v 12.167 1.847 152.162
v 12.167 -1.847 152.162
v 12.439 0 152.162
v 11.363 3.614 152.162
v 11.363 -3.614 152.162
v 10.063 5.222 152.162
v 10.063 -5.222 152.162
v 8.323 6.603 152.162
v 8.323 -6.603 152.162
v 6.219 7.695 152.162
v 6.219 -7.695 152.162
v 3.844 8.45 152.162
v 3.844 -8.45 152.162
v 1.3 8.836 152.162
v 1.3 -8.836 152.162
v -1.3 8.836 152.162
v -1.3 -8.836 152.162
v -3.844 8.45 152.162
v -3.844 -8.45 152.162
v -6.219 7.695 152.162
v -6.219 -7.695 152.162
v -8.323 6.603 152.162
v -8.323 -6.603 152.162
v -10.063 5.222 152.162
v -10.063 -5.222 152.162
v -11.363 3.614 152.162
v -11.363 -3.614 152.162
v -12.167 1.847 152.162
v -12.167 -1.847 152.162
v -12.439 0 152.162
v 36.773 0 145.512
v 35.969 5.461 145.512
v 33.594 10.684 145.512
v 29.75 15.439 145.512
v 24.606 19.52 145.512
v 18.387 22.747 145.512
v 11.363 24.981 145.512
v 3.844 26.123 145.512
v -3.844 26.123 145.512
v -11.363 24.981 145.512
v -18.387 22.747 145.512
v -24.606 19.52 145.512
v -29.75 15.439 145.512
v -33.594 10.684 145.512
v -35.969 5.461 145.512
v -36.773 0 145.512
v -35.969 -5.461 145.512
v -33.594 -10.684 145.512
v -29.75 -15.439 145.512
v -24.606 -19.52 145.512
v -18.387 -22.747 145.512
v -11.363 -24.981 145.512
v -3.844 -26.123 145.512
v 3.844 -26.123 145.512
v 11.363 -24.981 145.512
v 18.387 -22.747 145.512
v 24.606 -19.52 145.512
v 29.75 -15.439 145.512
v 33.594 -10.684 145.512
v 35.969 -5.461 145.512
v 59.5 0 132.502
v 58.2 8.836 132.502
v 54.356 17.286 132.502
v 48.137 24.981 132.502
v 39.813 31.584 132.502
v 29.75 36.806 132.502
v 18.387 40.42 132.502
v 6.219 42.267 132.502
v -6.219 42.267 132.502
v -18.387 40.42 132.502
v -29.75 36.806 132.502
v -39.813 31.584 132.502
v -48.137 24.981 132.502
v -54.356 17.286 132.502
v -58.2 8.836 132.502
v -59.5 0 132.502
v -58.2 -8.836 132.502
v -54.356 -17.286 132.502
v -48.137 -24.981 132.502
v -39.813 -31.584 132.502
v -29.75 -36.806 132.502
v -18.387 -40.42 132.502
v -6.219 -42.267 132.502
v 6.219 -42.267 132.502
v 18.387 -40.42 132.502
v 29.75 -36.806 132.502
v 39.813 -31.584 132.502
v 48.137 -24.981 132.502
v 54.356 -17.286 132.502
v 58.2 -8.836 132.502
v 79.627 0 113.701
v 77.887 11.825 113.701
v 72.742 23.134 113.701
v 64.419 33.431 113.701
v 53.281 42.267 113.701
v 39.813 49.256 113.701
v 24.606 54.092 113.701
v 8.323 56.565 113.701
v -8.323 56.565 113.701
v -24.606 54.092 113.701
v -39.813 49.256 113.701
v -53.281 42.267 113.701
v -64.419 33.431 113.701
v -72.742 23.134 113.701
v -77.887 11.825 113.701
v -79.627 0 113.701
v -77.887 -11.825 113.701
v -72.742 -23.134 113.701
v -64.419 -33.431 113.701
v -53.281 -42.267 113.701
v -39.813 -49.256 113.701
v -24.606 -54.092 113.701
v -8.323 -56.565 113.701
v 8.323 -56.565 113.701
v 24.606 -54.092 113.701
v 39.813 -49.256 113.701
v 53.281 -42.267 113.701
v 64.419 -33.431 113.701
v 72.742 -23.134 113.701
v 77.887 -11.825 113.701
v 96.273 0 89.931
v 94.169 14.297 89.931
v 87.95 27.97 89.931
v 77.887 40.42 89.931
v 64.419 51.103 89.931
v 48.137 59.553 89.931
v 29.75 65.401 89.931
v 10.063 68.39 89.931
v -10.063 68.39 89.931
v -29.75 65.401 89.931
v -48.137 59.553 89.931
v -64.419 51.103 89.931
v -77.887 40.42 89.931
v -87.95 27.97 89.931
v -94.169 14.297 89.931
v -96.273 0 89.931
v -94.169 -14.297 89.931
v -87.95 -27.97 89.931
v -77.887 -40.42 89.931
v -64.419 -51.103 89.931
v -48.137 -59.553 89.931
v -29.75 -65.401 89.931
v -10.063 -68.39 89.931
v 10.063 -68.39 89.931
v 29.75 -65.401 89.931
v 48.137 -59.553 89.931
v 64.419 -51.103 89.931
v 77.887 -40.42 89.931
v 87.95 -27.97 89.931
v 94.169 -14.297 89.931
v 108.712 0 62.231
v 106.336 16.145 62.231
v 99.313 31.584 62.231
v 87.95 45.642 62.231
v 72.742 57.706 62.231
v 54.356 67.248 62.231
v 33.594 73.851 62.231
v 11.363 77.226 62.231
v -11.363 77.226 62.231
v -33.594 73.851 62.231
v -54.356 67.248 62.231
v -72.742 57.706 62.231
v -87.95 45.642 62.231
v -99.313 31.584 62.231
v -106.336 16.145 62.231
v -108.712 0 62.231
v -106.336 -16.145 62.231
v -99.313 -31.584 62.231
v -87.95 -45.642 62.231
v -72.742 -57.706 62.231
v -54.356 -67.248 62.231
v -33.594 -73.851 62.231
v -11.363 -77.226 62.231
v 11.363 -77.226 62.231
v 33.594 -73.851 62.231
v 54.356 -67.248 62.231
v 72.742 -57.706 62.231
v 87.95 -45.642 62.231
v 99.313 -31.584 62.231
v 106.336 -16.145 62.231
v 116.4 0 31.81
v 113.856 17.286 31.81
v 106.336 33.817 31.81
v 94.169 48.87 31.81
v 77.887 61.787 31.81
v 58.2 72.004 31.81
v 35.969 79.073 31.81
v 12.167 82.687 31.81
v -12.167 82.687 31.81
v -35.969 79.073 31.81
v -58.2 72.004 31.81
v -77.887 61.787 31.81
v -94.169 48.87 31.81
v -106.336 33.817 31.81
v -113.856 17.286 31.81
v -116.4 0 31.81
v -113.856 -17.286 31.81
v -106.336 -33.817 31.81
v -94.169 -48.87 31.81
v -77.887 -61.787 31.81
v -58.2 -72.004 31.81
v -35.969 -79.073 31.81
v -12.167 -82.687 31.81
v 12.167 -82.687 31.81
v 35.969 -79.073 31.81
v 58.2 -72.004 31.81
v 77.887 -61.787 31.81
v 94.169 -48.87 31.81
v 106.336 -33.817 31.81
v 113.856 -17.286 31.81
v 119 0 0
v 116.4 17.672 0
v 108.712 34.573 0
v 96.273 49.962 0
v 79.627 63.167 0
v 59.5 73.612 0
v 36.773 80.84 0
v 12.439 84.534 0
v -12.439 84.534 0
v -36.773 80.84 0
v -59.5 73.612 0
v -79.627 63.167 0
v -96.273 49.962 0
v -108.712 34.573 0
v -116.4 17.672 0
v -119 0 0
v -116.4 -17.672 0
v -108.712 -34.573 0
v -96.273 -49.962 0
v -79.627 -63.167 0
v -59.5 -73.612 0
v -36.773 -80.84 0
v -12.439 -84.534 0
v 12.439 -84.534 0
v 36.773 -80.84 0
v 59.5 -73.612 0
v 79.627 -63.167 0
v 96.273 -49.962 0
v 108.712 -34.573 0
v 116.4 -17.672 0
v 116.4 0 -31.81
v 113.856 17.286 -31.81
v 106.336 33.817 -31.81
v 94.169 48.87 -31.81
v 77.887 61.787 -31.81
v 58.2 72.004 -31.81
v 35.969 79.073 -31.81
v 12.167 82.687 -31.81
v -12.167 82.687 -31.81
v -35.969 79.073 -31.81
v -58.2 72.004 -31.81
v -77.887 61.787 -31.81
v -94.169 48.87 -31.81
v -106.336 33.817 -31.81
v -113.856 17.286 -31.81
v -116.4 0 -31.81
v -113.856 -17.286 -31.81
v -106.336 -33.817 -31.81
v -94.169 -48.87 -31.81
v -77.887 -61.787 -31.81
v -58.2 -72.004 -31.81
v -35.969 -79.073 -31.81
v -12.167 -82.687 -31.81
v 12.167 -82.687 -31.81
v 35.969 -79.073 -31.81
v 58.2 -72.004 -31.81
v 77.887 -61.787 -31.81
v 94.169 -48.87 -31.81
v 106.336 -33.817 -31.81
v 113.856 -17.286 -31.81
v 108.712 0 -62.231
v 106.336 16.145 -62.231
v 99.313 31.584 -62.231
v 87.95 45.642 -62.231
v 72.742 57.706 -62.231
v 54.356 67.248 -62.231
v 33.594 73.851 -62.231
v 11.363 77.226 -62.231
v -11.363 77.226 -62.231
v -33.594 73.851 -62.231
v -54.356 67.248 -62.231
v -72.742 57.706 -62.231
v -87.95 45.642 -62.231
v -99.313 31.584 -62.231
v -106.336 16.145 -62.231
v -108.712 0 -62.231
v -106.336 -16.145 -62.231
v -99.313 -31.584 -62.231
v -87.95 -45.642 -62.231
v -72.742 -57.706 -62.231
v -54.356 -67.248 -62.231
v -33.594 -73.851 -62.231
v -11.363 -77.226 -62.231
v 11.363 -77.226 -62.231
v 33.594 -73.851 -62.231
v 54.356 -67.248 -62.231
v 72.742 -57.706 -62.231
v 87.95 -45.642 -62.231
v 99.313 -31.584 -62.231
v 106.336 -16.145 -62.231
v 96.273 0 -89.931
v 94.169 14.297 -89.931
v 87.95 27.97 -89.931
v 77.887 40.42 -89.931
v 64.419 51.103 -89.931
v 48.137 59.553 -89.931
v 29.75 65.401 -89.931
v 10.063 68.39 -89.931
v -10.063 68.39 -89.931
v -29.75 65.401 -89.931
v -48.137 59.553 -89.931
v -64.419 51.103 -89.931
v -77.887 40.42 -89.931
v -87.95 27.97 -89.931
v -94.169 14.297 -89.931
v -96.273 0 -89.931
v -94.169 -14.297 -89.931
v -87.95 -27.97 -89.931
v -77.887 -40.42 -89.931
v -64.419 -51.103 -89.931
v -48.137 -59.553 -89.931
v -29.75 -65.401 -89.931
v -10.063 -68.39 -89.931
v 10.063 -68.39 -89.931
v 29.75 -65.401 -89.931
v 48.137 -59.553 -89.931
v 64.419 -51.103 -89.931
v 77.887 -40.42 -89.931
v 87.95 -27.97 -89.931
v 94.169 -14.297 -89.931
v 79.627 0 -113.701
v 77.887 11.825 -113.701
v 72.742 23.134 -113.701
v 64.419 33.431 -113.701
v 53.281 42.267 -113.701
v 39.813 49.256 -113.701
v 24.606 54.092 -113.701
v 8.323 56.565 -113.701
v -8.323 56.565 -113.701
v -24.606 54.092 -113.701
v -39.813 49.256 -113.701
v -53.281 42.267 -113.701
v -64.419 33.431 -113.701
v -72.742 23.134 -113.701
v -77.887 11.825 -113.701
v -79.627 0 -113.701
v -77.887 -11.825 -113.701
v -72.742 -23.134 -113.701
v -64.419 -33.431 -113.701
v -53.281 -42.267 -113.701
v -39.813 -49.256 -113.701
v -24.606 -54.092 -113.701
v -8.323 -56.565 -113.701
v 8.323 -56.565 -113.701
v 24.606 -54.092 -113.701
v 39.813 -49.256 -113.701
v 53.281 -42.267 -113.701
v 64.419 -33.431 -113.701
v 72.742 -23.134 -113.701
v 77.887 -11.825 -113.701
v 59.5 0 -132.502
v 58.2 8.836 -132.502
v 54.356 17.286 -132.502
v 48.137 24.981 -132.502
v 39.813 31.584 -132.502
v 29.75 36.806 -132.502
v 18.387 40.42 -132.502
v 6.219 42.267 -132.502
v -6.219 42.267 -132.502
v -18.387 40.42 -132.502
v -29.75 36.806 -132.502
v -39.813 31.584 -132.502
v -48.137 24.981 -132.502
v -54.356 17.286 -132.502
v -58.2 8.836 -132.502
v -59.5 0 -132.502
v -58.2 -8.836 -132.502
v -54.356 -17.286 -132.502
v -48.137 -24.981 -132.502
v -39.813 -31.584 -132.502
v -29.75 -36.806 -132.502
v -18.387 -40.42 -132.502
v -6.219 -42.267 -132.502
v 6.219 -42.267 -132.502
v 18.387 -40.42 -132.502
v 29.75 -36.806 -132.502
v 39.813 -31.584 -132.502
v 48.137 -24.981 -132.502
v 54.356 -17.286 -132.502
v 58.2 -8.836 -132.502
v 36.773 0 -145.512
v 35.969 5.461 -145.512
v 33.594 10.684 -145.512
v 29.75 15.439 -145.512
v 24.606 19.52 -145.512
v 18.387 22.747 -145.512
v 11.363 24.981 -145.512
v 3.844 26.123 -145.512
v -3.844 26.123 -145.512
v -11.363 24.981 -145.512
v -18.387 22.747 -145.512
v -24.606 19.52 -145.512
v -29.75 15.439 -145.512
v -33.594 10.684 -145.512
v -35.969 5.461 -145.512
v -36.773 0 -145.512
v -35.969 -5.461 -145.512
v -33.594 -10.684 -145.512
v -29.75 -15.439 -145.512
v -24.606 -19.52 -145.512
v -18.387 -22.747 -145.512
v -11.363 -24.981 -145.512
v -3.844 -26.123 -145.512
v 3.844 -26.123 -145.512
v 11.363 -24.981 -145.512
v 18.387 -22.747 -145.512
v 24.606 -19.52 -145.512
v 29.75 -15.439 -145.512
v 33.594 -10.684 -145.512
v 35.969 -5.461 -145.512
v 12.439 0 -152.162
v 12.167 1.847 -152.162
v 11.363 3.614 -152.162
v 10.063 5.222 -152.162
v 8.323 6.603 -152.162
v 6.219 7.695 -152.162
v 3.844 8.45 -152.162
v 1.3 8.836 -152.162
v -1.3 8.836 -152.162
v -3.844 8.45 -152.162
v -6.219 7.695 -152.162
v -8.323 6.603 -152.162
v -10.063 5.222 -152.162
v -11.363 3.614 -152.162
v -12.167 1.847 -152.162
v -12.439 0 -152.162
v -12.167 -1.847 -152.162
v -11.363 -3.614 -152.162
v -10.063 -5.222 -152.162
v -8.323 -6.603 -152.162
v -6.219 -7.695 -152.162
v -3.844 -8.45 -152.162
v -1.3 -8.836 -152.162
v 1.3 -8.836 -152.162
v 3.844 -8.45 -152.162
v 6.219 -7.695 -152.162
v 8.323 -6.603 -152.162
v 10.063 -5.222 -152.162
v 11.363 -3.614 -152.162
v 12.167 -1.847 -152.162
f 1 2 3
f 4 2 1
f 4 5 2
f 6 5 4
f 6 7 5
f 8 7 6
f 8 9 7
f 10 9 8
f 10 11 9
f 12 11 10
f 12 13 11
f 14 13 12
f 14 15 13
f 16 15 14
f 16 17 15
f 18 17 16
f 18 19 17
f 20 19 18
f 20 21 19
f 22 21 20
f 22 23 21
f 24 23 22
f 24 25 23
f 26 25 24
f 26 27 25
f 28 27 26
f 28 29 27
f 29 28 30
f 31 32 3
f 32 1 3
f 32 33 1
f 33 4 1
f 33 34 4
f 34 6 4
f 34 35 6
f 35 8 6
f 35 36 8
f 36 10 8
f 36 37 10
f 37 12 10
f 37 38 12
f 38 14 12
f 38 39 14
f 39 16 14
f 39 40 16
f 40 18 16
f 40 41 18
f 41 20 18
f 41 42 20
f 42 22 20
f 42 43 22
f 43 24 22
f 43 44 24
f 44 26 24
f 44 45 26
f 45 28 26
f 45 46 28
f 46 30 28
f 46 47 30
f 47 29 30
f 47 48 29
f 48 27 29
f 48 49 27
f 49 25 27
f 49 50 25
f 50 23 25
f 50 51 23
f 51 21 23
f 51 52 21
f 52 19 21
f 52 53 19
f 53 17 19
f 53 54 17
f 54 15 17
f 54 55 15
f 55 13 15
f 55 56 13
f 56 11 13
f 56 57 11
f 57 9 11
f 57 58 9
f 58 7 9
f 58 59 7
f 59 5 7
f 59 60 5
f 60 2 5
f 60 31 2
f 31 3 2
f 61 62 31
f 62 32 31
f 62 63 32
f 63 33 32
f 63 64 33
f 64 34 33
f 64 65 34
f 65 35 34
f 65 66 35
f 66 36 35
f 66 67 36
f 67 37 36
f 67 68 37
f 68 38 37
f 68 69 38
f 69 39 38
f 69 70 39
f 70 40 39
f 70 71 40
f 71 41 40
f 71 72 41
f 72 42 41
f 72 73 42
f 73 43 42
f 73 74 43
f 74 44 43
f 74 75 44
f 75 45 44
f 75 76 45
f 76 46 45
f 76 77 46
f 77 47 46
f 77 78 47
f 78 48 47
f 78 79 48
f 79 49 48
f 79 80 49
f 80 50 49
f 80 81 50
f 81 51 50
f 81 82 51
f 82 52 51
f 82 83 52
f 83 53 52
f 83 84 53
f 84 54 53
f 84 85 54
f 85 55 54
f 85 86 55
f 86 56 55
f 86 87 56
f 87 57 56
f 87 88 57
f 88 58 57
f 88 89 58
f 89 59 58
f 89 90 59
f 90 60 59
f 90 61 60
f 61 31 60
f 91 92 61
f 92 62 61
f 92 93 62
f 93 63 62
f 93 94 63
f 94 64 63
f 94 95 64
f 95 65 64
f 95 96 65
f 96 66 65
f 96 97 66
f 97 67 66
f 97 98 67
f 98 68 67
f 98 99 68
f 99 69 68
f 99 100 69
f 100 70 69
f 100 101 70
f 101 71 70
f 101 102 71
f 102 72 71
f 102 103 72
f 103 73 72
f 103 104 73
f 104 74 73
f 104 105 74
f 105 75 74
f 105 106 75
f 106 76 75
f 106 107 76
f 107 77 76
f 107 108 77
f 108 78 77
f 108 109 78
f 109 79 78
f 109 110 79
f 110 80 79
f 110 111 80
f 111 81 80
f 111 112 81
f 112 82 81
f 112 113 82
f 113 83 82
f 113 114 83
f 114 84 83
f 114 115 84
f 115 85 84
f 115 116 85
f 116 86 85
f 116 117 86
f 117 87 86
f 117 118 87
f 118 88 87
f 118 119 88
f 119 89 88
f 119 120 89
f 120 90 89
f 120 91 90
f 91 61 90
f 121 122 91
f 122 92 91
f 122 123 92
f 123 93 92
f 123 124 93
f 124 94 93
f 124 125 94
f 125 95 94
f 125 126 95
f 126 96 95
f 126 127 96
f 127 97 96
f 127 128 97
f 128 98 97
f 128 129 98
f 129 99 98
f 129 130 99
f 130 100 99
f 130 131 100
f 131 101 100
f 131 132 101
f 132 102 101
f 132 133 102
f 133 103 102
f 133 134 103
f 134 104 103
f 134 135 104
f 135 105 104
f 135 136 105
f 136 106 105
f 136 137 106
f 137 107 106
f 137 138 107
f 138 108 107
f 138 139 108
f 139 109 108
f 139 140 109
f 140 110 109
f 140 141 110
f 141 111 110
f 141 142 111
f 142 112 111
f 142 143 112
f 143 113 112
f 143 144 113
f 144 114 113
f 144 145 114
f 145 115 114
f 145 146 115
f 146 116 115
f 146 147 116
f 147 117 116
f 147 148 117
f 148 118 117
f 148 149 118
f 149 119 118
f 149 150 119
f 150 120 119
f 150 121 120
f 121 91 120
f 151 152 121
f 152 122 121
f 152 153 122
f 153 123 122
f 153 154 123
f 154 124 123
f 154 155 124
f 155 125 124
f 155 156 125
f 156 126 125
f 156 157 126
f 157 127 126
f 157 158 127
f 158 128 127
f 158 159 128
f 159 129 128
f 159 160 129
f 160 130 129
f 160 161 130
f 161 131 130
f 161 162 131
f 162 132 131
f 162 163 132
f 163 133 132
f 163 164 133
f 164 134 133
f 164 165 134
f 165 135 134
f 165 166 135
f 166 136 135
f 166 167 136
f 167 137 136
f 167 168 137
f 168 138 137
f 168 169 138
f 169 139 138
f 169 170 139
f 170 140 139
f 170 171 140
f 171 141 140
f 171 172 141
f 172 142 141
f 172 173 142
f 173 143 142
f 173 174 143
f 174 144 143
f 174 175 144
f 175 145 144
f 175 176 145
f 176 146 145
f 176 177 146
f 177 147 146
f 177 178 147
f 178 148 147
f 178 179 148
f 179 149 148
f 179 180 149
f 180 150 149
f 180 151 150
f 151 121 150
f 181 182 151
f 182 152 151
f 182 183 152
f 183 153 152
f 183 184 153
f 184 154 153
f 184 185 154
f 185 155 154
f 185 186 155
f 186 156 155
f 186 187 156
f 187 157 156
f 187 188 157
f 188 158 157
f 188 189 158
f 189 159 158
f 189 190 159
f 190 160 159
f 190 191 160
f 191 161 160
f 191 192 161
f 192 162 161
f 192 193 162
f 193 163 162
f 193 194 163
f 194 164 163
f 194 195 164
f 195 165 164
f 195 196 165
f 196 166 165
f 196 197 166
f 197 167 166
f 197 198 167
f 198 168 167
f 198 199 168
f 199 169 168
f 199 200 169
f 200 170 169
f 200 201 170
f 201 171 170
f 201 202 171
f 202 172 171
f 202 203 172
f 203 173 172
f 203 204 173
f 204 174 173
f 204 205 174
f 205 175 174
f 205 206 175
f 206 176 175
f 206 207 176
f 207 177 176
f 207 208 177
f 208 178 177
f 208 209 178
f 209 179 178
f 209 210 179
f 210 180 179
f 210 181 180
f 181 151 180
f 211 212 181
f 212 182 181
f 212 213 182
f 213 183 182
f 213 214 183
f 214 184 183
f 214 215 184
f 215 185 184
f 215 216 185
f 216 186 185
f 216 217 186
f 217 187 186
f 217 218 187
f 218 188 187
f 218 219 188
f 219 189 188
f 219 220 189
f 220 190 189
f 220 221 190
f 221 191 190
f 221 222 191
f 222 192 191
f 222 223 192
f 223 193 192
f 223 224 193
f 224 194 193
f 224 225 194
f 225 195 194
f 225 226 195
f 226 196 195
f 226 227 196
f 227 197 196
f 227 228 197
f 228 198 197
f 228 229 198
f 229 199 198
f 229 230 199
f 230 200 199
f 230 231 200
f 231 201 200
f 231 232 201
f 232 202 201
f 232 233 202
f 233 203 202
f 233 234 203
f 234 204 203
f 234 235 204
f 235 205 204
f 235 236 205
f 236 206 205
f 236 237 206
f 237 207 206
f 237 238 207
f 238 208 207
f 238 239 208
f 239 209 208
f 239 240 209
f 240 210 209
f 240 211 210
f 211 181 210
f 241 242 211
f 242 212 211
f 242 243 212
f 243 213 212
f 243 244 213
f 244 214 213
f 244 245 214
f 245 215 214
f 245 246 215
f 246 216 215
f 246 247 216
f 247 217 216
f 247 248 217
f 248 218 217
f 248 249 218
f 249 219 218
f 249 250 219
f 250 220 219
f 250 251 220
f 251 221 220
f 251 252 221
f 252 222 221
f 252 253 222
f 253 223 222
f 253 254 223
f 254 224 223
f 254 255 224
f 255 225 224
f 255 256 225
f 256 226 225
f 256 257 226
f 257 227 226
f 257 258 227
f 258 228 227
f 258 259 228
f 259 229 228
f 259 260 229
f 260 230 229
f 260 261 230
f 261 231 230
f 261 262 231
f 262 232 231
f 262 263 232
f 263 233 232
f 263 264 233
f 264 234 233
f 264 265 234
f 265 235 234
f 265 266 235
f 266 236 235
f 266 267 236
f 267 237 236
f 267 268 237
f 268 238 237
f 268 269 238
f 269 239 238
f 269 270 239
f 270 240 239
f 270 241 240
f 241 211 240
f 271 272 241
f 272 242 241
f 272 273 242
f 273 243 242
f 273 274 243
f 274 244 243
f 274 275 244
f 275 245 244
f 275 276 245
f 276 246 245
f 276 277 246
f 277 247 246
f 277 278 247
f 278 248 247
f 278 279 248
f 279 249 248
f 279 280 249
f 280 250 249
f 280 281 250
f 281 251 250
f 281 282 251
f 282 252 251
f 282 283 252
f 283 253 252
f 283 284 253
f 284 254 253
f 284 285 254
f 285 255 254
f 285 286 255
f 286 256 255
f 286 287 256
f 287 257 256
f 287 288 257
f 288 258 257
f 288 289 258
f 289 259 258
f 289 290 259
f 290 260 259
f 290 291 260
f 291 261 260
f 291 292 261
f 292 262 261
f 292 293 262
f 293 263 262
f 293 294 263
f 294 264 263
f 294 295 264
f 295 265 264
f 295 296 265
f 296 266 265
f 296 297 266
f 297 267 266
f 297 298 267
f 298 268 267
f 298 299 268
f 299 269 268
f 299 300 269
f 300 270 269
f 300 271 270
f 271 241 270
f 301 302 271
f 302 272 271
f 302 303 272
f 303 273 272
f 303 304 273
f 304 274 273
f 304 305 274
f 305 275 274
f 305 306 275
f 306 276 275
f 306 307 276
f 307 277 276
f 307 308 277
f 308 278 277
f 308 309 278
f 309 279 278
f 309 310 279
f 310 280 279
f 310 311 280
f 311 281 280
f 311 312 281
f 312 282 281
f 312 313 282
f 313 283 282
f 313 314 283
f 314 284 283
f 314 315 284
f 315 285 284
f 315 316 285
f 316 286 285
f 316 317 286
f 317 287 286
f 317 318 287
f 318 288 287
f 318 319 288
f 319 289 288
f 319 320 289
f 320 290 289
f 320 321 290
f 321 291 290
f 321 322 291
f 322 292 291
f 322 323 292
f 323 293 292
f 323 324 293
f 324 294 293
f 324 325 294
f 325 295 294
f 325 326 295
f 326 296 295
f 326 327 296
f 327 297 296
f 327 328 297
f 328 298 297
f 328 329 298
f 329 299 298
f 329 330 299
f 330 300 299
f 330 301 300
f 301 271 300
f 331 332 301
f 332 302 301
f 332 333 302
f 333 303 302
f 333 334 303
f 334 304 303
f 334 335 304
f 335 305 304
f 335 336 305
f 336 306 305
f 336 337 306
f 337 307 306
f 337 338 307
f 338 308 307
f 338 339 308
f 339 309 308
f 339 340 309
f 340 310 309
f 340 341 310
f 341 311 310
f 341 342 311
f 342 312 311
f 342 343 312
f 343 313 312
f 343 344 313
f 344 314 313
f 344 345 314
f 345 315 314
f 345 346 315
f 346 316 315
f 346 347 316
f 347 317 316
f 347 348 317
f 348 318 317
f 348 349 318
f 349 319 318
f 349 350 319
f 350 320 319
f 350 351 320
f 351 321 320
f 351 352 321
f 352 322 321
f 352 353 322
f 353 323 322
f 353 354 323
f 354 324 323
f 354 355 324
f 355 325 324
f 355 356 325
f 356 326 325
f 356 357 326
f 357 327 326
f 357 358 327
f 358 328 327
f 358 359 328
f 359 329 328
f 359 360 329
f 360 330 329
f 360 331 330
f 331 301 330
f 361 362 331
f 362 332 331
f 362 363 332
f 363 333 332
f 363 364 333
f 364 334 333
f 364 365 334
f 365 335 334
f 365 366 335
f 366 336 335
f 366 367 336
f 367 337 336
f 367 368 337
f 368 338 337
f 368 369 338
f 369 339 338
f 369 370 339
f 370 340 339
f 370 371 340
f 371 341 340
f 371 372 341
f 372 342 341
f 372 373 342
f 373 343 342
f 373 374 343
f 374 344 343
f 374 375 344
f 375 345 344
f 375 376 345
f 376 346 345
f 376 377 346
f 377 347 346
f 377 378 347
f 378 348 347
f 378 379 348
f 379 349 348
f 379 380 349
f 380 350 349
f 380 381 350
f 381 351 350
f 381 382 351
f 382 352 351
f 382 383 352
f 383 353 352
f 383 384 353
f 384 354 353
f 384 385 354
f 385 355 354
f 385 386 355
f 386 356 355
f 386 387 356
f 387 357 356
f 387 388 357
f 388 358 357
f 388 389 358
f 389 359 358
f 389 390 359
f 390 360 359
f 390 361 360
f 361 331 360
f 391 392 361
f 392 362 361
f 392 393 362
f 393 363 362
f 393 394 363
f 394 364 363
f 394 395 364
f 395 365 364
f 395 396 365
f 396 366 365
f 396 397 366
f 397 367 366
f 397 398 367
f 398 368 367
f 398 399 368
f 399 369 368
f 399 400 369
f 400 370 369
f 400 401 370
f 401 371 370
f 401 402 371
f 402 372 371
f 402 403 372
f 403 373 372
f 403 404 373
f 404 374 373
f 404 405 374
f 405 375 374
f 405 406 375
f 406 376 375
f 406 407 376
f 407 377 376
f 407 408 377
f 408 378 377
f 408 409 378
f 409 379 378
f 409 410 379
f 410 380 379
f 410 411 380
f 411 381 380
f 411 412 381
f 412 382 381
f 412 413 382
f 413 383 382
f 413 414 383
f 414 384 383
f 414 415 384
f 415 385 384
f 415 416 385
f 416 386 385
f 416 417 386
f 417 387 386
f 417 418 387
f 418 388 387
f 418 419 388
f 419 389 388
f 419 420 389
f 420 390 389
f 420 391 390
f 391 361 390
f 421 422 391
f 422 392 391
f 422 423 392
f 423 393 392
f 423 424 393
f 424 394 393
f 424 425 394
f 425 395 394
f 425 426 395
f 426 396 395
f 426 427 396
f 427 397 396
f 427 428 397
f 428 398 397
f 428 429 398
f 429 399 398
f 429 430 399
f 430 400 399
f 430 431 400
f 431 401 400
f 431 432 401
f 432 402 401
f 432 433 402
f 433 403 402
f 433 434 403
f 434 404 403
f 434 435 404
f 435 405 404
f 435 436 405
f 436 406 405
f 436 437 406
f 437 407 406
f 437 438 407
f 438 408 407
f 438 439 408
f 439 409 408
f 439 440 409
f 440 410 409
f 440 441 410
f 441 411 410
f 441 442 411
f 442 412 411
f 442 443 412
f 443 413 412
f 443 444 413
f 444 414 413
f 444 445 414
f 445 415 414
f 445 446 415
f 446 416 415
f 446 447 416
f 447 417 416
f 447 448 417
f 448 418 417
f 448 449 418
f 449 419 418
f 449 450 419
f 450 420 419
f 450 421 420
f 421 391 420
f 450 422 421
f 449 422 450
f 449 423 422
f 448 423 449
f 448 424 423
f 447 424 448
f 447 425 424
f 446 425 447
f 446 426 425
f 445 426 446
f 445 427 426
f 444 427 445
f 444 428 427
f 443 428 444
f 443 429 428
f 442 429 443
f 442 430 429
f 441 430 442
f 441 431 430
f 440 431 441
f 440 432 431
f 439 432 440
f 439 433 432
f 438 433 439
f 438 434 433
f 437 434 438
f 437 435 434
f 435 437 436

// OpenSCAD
// Generated by SolidPython 1.0.1 on 2020-07-29 00:46:47


scale(v = [7, 5, 9]) {
	sphere(r = 17);
}
/***********************************************
*********      SolidPython code:      **********
************************************************
 
# import packages: SolidPython
from solid import *
from solid.utils import *
from itertools import chain, combinations, permutations


class Resize:

    def __init__(self, scad_file):
        self.scad_file = scad_file
        #self.scad_file = import_scad(scad_file)
        # cone/cylinder param:
        self.r1 = 0
        self.r2 = 0
        self.h = 0
        # rectangular prism param:
        self.w = 0
        self.l = 0
        # ellipse param:
        self.r = 0

    # import OpenScad code (file name corresponds to shape)


    # classify shape + parameters
    def assign(self, param1, param2, param3):
        if self.scad_file == 'cone.scad':
            self.r1 = param1
            self.r2 = param2
            self.h = param3
        elif self.scad_file == 'cylinder.scad':
            self.r1 = param1
            self.r2 = param2
            self.h = param3
        elif self.scad_file == 'rectangularPrism.scad':
            self.h = param1
            self.l = param2
            self.w = param3
        else:
            self.r = param1
            self.h = param2

    # resize parameters
    def iterate(self):
        x = range(3, 20, 2)
        i = 1
        if self.scad_file == 'cone.scad':
            tempList = list(permutations(x, 2))
            for temp in tempList:
                param1 = temp[0]
                param2 = temp[1]
                filepath = 'produced_scad_files/' + 'cone' + str(param1) + '_' + str(param2) + '_' + '.scad'
                scad_render_to_file(cylinder(h=param1, r1=param2, r2=0), filepath)

        elif self.scad_file == 'cylinder.scad':
            tempList = list(permutations(x, 3))
            for temp in tempList:
                param1 = temp[0]
                param2 = temp[1]
                filepath = 'produced_scad_files/' + 'cylinder' + str(param1) + '_' + str(param2) + '_' + '.scad'
                scad_render_to_file(cylinder(h=param1, r1=param2, r2=param2), filepath)

        elif self.scad_file == 'rectangularPrism.scad':
            tempList = list(permutations(x, 3))
            for temp in tempList:
                param1 = temp[0]
                param2 = temp[1]
                param3 = temp[2]
                filepath = 'produced_scad_files/' + 'rectangularPrism' + str(param1) + '_' + str(param2) + '_' + str(
                    param3) + '.scad'
                scad_render_to_file(cube(size=(param1, param2, param3)), filepath)

        elif self.scad_file == 'ellipse.scad':
            tempList = list(permutations(x, 4))
            for temp in tempList:
                param1 = temp[0]
                param2 = temp[1]
                param3 = temp[2]
                param4 = temp[3]
                filepath = 'produced_scad_files/' + 'ellipse' + str(param1) + '_' + str(param2) + '_' + str(param3) + '_' + str(param4) + '.scad'
                scad_render_to_file(scale([param1, param2, param3])(sphere(r=param4)), filepath)

    def render_to_scadfile(self):
        scad_render_to_file(scad, 'example.scad') 
 
************************************************/
